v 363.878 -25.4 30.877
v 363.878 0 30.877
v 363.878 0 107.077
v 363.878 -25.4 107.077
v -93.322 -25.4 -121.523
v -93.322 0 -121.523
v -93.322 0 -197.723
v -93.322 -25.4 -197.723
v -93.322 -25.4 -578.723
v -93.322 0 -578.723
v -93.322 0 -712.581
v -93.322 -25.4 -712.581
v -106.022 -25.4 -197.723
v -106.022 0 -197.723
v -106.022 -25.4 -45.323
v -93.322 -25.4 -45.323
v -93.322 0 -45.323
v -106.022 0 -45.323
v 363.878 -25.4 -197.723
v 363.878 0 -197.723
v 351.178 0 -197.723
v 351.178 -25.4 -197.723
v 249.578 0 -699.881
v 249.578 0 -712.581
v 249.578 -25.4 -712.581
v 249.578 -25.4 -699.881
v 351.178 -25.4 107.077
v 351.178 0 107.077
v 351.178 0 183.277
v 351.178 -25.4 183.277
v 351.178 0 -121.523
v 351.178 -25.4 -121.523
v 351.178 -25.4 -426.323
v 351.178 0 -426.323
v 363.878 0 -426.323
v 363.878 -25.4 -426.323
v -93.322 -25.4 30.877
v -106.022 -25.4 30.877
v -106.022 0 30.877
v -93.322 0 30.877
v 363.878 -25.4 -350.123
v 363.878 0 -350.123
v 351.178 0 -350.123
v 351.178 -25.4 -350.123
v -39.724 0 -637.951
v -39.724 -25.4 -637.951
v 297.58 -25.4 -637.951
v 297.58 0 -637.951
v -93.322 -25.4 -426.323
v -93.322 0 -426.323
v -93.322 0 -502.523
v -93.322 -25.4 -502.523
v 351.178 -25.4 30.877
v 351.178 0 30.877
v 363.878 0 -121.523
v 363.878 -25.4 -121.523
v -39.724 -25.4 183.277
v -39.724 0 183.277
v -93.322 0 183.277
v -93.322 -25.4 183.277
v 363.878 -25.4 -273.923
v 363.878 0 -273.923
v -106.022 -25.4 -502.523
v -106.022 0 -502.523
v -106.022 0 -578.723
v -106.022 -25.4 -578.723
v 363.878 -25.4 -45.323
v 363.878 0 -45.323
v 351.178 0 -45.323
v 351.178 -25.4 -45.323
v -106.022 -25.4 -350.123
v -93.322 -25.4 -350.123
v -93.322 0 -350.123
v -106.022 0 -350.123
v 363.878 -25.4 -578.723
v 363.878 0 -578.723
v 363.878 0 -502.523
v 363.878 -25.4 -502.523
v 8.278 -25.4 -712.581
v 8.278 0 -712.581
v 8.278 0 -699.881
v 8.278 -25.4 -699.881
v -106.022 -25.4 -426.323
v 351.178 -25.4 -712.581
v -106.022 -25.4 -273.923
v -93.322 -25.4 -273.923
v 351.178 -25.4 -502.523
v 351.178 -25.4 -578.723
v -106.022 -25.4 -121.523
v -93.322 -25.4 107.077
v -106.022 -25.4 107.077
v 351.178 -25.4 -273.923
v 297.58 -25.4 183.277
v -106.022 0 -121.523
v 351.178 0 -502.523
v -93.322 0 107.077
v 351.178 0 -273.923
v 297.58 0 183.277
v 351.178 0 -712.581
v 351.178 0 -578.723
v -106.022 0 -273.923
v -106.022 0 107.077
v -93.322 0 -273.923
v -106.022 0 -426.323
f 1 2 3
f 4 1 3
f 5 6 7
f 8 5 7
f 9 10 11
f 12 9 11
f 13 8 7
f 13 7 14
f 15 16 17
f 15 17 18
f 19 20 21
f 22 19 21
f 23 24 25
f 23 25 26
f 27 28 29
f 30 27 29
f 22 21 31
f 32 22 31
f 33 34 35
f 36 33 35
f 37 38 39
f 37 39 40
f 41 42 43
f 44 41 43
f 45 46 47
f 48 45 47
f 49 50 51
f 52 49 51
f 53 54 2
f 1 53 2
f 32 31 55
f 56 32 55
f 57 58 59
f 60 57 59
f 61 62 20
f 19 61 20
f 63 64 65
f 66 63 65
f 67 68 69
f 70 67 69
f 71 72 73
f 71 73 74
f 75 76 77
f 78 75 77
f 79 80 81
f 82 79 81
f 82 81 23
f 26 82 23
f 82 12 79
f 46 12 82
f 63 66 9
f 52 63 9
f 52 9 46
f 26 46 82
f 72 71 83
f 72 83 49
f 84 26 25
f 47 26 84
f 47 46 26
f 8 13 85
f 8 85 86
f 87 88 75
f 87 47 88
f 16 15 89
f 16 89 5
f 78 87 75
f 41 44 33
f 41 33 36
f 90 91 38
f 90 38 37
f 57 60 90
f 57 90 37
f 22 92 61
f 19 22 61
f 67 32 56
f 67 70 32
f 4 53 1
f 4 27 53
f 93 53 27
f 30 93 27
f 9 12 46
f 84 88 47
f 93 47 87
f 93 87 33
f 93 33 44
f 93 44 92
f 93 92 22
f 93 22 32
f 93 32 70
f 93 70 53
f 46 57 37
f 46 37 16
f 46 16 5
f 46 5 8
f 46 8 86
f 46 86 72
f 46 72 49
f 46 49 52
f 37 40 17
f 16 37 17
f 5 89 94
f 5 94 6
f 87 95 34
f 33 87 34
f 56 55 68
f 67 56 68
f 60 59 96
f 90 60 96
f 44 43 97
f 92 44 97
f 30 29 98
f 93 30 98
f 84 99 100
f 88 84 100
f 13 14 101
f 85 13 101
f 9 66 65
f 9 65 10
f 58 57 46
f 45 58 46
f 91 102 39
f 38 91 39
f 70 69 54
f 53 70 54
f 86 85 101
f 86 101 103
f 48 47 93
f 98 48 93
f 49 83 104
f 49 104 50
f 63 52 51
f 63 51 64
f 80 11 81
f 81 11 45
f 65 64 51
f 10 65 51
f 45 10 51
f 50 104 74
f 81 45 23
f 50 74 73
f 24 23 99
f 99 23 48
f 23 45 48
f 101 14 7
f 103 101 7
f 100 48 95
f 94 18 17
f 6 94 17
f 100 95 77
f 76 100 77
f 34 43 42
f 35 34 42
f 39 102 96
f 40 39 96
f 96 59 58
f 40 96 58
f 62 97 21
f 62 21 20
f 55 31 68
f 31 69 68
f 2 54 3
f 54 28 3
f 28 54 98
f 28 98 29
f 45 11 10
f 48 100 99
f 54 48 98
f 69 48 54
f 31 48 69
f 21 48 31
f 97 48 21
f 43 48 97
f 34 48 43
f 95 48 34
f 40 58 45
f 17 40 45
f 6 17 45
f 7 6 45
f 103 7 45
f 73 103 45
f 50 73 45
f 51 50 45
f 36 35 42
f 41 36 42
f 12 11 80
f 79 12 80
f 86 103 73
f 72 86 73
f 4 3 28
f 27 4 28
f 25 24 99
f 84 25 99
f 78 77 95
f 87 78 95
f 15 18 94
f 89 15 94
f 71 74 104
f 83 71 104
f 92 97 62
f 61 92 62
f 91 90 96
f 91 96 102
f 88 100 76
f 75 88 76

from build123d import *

# Parameters (mm, degrees)
F0_W     = 101.6
F0_H     = 12.7
F1_DEPTH = 25.4
F2_W     = 168.6520413041
F2_H     = 61.9295807295
F2_H_2   = 759.2988385411
F3_DEPTH = 25.401


with BuildPart() as f1:
    # F0 (on Front) → F1 (new body)
    with BuildSketch(Plane.XZ):
        Polygon((128.9281710505, -699.8807162309), (128.9281710505, 183.2772837691), (-93.3218289495, 183.2772837691), (-93.3218289495, 107.0772837691), (-106.0218289495, 107.0772837691), (-106.0218289495, 30.8772837691), (-93.3218289495, 30.8772837691), (-93.3218289495, -45.3227162309), (-106.0218289495, -45.3227162309), (-106.0218289495, -121.5227162309), (-93.3218289495, -121.5227162309), (-93.3218289495, -197.7227162309), (-106.0218289495, -197.7227162309), (-106.0218289495, -273.9227162309), (-93.3218289495, -273.9227162309), (-93.3218289495, -350.1227162309), (-106.0218289495, -350.1227162309), (-106.0218289495, -426.3227162309), (-93.3218289495, -426.3227162309), (-93.3218289495, -502.5227162309), (-106.0218289495, -502.5227162309), (-106.0218289495, -578.7227162309), (-93.3218289495, -578.7227162309), (-93.3218289495, -699.8807162309), (8.2781710505, -699.8807162309), align=None)
        Polygon((351.1781710505, 183.2772837691), (128.9281710505, 183.2772837691), (128.9281710505, -699.8807162309), (249.5781710505, -699.8807162309), (351.1781710505, -699.8807162309), (351.1781710505, -578.7227162309), (363.8781710505, -578.7227162309), (363.8781710505, -502.5227162309), (351.1781710505, -502.5227162309), (351.1781710505, -426.3227162309), (363.8781710505, -426.3227162309), (363.8781710505, -350.1227162309), (351.1781710505, -350.1227162309), (351.1781710505, -273.9227162309), (363.8781710505, -273.9227162309), (363.8781710505, -197.7227162309), (351.1781710505, -197.7227162309), (351.1781710505, -121.5227162309), (363.8781710505, -121.5227162309), (363.8781710505, -45.3227162309), (351.1781710505, -45.3227162309), (351.1781710505, 30.8772837691), (363.8781710505, 30.8772837691), (363.8781710505, 107.0772837691), (351.1781710505, 107.0772837691), align=None)
        with Locations((-42.5218289495, -706.2307162309)):
            Rectangle(F0_W, F0_H)
        with Locations((300.3781710505, -706.2307162309)):
            Rectangle(F0_W, F0_H)
    extrude(amount=F1_DEPTH)

    # F2 (on face) → F3 (cut, through all)
    with BuildSketch(Plane.XZ.offset(25.4)):
        with Locations((213.2541917026, 152.3124934044)):
            Rectangle(F2_W, F2_H)
        with Locations((44.6021503985, 152.3124934044)):
            Rectangle(F2_W, F2_H)
        with Locations((213.2541917026, -258.3017162309)):
            Rectangle(F2_W, F2_H_2)
        with Locations((44.6021503985, -258.3017162309)):
            Rectangle(F2_W, F2_H_2)
    extrude(amount=-F3_DEPTH, mode=Mode.SUBTRACT)


solid = f1.part
